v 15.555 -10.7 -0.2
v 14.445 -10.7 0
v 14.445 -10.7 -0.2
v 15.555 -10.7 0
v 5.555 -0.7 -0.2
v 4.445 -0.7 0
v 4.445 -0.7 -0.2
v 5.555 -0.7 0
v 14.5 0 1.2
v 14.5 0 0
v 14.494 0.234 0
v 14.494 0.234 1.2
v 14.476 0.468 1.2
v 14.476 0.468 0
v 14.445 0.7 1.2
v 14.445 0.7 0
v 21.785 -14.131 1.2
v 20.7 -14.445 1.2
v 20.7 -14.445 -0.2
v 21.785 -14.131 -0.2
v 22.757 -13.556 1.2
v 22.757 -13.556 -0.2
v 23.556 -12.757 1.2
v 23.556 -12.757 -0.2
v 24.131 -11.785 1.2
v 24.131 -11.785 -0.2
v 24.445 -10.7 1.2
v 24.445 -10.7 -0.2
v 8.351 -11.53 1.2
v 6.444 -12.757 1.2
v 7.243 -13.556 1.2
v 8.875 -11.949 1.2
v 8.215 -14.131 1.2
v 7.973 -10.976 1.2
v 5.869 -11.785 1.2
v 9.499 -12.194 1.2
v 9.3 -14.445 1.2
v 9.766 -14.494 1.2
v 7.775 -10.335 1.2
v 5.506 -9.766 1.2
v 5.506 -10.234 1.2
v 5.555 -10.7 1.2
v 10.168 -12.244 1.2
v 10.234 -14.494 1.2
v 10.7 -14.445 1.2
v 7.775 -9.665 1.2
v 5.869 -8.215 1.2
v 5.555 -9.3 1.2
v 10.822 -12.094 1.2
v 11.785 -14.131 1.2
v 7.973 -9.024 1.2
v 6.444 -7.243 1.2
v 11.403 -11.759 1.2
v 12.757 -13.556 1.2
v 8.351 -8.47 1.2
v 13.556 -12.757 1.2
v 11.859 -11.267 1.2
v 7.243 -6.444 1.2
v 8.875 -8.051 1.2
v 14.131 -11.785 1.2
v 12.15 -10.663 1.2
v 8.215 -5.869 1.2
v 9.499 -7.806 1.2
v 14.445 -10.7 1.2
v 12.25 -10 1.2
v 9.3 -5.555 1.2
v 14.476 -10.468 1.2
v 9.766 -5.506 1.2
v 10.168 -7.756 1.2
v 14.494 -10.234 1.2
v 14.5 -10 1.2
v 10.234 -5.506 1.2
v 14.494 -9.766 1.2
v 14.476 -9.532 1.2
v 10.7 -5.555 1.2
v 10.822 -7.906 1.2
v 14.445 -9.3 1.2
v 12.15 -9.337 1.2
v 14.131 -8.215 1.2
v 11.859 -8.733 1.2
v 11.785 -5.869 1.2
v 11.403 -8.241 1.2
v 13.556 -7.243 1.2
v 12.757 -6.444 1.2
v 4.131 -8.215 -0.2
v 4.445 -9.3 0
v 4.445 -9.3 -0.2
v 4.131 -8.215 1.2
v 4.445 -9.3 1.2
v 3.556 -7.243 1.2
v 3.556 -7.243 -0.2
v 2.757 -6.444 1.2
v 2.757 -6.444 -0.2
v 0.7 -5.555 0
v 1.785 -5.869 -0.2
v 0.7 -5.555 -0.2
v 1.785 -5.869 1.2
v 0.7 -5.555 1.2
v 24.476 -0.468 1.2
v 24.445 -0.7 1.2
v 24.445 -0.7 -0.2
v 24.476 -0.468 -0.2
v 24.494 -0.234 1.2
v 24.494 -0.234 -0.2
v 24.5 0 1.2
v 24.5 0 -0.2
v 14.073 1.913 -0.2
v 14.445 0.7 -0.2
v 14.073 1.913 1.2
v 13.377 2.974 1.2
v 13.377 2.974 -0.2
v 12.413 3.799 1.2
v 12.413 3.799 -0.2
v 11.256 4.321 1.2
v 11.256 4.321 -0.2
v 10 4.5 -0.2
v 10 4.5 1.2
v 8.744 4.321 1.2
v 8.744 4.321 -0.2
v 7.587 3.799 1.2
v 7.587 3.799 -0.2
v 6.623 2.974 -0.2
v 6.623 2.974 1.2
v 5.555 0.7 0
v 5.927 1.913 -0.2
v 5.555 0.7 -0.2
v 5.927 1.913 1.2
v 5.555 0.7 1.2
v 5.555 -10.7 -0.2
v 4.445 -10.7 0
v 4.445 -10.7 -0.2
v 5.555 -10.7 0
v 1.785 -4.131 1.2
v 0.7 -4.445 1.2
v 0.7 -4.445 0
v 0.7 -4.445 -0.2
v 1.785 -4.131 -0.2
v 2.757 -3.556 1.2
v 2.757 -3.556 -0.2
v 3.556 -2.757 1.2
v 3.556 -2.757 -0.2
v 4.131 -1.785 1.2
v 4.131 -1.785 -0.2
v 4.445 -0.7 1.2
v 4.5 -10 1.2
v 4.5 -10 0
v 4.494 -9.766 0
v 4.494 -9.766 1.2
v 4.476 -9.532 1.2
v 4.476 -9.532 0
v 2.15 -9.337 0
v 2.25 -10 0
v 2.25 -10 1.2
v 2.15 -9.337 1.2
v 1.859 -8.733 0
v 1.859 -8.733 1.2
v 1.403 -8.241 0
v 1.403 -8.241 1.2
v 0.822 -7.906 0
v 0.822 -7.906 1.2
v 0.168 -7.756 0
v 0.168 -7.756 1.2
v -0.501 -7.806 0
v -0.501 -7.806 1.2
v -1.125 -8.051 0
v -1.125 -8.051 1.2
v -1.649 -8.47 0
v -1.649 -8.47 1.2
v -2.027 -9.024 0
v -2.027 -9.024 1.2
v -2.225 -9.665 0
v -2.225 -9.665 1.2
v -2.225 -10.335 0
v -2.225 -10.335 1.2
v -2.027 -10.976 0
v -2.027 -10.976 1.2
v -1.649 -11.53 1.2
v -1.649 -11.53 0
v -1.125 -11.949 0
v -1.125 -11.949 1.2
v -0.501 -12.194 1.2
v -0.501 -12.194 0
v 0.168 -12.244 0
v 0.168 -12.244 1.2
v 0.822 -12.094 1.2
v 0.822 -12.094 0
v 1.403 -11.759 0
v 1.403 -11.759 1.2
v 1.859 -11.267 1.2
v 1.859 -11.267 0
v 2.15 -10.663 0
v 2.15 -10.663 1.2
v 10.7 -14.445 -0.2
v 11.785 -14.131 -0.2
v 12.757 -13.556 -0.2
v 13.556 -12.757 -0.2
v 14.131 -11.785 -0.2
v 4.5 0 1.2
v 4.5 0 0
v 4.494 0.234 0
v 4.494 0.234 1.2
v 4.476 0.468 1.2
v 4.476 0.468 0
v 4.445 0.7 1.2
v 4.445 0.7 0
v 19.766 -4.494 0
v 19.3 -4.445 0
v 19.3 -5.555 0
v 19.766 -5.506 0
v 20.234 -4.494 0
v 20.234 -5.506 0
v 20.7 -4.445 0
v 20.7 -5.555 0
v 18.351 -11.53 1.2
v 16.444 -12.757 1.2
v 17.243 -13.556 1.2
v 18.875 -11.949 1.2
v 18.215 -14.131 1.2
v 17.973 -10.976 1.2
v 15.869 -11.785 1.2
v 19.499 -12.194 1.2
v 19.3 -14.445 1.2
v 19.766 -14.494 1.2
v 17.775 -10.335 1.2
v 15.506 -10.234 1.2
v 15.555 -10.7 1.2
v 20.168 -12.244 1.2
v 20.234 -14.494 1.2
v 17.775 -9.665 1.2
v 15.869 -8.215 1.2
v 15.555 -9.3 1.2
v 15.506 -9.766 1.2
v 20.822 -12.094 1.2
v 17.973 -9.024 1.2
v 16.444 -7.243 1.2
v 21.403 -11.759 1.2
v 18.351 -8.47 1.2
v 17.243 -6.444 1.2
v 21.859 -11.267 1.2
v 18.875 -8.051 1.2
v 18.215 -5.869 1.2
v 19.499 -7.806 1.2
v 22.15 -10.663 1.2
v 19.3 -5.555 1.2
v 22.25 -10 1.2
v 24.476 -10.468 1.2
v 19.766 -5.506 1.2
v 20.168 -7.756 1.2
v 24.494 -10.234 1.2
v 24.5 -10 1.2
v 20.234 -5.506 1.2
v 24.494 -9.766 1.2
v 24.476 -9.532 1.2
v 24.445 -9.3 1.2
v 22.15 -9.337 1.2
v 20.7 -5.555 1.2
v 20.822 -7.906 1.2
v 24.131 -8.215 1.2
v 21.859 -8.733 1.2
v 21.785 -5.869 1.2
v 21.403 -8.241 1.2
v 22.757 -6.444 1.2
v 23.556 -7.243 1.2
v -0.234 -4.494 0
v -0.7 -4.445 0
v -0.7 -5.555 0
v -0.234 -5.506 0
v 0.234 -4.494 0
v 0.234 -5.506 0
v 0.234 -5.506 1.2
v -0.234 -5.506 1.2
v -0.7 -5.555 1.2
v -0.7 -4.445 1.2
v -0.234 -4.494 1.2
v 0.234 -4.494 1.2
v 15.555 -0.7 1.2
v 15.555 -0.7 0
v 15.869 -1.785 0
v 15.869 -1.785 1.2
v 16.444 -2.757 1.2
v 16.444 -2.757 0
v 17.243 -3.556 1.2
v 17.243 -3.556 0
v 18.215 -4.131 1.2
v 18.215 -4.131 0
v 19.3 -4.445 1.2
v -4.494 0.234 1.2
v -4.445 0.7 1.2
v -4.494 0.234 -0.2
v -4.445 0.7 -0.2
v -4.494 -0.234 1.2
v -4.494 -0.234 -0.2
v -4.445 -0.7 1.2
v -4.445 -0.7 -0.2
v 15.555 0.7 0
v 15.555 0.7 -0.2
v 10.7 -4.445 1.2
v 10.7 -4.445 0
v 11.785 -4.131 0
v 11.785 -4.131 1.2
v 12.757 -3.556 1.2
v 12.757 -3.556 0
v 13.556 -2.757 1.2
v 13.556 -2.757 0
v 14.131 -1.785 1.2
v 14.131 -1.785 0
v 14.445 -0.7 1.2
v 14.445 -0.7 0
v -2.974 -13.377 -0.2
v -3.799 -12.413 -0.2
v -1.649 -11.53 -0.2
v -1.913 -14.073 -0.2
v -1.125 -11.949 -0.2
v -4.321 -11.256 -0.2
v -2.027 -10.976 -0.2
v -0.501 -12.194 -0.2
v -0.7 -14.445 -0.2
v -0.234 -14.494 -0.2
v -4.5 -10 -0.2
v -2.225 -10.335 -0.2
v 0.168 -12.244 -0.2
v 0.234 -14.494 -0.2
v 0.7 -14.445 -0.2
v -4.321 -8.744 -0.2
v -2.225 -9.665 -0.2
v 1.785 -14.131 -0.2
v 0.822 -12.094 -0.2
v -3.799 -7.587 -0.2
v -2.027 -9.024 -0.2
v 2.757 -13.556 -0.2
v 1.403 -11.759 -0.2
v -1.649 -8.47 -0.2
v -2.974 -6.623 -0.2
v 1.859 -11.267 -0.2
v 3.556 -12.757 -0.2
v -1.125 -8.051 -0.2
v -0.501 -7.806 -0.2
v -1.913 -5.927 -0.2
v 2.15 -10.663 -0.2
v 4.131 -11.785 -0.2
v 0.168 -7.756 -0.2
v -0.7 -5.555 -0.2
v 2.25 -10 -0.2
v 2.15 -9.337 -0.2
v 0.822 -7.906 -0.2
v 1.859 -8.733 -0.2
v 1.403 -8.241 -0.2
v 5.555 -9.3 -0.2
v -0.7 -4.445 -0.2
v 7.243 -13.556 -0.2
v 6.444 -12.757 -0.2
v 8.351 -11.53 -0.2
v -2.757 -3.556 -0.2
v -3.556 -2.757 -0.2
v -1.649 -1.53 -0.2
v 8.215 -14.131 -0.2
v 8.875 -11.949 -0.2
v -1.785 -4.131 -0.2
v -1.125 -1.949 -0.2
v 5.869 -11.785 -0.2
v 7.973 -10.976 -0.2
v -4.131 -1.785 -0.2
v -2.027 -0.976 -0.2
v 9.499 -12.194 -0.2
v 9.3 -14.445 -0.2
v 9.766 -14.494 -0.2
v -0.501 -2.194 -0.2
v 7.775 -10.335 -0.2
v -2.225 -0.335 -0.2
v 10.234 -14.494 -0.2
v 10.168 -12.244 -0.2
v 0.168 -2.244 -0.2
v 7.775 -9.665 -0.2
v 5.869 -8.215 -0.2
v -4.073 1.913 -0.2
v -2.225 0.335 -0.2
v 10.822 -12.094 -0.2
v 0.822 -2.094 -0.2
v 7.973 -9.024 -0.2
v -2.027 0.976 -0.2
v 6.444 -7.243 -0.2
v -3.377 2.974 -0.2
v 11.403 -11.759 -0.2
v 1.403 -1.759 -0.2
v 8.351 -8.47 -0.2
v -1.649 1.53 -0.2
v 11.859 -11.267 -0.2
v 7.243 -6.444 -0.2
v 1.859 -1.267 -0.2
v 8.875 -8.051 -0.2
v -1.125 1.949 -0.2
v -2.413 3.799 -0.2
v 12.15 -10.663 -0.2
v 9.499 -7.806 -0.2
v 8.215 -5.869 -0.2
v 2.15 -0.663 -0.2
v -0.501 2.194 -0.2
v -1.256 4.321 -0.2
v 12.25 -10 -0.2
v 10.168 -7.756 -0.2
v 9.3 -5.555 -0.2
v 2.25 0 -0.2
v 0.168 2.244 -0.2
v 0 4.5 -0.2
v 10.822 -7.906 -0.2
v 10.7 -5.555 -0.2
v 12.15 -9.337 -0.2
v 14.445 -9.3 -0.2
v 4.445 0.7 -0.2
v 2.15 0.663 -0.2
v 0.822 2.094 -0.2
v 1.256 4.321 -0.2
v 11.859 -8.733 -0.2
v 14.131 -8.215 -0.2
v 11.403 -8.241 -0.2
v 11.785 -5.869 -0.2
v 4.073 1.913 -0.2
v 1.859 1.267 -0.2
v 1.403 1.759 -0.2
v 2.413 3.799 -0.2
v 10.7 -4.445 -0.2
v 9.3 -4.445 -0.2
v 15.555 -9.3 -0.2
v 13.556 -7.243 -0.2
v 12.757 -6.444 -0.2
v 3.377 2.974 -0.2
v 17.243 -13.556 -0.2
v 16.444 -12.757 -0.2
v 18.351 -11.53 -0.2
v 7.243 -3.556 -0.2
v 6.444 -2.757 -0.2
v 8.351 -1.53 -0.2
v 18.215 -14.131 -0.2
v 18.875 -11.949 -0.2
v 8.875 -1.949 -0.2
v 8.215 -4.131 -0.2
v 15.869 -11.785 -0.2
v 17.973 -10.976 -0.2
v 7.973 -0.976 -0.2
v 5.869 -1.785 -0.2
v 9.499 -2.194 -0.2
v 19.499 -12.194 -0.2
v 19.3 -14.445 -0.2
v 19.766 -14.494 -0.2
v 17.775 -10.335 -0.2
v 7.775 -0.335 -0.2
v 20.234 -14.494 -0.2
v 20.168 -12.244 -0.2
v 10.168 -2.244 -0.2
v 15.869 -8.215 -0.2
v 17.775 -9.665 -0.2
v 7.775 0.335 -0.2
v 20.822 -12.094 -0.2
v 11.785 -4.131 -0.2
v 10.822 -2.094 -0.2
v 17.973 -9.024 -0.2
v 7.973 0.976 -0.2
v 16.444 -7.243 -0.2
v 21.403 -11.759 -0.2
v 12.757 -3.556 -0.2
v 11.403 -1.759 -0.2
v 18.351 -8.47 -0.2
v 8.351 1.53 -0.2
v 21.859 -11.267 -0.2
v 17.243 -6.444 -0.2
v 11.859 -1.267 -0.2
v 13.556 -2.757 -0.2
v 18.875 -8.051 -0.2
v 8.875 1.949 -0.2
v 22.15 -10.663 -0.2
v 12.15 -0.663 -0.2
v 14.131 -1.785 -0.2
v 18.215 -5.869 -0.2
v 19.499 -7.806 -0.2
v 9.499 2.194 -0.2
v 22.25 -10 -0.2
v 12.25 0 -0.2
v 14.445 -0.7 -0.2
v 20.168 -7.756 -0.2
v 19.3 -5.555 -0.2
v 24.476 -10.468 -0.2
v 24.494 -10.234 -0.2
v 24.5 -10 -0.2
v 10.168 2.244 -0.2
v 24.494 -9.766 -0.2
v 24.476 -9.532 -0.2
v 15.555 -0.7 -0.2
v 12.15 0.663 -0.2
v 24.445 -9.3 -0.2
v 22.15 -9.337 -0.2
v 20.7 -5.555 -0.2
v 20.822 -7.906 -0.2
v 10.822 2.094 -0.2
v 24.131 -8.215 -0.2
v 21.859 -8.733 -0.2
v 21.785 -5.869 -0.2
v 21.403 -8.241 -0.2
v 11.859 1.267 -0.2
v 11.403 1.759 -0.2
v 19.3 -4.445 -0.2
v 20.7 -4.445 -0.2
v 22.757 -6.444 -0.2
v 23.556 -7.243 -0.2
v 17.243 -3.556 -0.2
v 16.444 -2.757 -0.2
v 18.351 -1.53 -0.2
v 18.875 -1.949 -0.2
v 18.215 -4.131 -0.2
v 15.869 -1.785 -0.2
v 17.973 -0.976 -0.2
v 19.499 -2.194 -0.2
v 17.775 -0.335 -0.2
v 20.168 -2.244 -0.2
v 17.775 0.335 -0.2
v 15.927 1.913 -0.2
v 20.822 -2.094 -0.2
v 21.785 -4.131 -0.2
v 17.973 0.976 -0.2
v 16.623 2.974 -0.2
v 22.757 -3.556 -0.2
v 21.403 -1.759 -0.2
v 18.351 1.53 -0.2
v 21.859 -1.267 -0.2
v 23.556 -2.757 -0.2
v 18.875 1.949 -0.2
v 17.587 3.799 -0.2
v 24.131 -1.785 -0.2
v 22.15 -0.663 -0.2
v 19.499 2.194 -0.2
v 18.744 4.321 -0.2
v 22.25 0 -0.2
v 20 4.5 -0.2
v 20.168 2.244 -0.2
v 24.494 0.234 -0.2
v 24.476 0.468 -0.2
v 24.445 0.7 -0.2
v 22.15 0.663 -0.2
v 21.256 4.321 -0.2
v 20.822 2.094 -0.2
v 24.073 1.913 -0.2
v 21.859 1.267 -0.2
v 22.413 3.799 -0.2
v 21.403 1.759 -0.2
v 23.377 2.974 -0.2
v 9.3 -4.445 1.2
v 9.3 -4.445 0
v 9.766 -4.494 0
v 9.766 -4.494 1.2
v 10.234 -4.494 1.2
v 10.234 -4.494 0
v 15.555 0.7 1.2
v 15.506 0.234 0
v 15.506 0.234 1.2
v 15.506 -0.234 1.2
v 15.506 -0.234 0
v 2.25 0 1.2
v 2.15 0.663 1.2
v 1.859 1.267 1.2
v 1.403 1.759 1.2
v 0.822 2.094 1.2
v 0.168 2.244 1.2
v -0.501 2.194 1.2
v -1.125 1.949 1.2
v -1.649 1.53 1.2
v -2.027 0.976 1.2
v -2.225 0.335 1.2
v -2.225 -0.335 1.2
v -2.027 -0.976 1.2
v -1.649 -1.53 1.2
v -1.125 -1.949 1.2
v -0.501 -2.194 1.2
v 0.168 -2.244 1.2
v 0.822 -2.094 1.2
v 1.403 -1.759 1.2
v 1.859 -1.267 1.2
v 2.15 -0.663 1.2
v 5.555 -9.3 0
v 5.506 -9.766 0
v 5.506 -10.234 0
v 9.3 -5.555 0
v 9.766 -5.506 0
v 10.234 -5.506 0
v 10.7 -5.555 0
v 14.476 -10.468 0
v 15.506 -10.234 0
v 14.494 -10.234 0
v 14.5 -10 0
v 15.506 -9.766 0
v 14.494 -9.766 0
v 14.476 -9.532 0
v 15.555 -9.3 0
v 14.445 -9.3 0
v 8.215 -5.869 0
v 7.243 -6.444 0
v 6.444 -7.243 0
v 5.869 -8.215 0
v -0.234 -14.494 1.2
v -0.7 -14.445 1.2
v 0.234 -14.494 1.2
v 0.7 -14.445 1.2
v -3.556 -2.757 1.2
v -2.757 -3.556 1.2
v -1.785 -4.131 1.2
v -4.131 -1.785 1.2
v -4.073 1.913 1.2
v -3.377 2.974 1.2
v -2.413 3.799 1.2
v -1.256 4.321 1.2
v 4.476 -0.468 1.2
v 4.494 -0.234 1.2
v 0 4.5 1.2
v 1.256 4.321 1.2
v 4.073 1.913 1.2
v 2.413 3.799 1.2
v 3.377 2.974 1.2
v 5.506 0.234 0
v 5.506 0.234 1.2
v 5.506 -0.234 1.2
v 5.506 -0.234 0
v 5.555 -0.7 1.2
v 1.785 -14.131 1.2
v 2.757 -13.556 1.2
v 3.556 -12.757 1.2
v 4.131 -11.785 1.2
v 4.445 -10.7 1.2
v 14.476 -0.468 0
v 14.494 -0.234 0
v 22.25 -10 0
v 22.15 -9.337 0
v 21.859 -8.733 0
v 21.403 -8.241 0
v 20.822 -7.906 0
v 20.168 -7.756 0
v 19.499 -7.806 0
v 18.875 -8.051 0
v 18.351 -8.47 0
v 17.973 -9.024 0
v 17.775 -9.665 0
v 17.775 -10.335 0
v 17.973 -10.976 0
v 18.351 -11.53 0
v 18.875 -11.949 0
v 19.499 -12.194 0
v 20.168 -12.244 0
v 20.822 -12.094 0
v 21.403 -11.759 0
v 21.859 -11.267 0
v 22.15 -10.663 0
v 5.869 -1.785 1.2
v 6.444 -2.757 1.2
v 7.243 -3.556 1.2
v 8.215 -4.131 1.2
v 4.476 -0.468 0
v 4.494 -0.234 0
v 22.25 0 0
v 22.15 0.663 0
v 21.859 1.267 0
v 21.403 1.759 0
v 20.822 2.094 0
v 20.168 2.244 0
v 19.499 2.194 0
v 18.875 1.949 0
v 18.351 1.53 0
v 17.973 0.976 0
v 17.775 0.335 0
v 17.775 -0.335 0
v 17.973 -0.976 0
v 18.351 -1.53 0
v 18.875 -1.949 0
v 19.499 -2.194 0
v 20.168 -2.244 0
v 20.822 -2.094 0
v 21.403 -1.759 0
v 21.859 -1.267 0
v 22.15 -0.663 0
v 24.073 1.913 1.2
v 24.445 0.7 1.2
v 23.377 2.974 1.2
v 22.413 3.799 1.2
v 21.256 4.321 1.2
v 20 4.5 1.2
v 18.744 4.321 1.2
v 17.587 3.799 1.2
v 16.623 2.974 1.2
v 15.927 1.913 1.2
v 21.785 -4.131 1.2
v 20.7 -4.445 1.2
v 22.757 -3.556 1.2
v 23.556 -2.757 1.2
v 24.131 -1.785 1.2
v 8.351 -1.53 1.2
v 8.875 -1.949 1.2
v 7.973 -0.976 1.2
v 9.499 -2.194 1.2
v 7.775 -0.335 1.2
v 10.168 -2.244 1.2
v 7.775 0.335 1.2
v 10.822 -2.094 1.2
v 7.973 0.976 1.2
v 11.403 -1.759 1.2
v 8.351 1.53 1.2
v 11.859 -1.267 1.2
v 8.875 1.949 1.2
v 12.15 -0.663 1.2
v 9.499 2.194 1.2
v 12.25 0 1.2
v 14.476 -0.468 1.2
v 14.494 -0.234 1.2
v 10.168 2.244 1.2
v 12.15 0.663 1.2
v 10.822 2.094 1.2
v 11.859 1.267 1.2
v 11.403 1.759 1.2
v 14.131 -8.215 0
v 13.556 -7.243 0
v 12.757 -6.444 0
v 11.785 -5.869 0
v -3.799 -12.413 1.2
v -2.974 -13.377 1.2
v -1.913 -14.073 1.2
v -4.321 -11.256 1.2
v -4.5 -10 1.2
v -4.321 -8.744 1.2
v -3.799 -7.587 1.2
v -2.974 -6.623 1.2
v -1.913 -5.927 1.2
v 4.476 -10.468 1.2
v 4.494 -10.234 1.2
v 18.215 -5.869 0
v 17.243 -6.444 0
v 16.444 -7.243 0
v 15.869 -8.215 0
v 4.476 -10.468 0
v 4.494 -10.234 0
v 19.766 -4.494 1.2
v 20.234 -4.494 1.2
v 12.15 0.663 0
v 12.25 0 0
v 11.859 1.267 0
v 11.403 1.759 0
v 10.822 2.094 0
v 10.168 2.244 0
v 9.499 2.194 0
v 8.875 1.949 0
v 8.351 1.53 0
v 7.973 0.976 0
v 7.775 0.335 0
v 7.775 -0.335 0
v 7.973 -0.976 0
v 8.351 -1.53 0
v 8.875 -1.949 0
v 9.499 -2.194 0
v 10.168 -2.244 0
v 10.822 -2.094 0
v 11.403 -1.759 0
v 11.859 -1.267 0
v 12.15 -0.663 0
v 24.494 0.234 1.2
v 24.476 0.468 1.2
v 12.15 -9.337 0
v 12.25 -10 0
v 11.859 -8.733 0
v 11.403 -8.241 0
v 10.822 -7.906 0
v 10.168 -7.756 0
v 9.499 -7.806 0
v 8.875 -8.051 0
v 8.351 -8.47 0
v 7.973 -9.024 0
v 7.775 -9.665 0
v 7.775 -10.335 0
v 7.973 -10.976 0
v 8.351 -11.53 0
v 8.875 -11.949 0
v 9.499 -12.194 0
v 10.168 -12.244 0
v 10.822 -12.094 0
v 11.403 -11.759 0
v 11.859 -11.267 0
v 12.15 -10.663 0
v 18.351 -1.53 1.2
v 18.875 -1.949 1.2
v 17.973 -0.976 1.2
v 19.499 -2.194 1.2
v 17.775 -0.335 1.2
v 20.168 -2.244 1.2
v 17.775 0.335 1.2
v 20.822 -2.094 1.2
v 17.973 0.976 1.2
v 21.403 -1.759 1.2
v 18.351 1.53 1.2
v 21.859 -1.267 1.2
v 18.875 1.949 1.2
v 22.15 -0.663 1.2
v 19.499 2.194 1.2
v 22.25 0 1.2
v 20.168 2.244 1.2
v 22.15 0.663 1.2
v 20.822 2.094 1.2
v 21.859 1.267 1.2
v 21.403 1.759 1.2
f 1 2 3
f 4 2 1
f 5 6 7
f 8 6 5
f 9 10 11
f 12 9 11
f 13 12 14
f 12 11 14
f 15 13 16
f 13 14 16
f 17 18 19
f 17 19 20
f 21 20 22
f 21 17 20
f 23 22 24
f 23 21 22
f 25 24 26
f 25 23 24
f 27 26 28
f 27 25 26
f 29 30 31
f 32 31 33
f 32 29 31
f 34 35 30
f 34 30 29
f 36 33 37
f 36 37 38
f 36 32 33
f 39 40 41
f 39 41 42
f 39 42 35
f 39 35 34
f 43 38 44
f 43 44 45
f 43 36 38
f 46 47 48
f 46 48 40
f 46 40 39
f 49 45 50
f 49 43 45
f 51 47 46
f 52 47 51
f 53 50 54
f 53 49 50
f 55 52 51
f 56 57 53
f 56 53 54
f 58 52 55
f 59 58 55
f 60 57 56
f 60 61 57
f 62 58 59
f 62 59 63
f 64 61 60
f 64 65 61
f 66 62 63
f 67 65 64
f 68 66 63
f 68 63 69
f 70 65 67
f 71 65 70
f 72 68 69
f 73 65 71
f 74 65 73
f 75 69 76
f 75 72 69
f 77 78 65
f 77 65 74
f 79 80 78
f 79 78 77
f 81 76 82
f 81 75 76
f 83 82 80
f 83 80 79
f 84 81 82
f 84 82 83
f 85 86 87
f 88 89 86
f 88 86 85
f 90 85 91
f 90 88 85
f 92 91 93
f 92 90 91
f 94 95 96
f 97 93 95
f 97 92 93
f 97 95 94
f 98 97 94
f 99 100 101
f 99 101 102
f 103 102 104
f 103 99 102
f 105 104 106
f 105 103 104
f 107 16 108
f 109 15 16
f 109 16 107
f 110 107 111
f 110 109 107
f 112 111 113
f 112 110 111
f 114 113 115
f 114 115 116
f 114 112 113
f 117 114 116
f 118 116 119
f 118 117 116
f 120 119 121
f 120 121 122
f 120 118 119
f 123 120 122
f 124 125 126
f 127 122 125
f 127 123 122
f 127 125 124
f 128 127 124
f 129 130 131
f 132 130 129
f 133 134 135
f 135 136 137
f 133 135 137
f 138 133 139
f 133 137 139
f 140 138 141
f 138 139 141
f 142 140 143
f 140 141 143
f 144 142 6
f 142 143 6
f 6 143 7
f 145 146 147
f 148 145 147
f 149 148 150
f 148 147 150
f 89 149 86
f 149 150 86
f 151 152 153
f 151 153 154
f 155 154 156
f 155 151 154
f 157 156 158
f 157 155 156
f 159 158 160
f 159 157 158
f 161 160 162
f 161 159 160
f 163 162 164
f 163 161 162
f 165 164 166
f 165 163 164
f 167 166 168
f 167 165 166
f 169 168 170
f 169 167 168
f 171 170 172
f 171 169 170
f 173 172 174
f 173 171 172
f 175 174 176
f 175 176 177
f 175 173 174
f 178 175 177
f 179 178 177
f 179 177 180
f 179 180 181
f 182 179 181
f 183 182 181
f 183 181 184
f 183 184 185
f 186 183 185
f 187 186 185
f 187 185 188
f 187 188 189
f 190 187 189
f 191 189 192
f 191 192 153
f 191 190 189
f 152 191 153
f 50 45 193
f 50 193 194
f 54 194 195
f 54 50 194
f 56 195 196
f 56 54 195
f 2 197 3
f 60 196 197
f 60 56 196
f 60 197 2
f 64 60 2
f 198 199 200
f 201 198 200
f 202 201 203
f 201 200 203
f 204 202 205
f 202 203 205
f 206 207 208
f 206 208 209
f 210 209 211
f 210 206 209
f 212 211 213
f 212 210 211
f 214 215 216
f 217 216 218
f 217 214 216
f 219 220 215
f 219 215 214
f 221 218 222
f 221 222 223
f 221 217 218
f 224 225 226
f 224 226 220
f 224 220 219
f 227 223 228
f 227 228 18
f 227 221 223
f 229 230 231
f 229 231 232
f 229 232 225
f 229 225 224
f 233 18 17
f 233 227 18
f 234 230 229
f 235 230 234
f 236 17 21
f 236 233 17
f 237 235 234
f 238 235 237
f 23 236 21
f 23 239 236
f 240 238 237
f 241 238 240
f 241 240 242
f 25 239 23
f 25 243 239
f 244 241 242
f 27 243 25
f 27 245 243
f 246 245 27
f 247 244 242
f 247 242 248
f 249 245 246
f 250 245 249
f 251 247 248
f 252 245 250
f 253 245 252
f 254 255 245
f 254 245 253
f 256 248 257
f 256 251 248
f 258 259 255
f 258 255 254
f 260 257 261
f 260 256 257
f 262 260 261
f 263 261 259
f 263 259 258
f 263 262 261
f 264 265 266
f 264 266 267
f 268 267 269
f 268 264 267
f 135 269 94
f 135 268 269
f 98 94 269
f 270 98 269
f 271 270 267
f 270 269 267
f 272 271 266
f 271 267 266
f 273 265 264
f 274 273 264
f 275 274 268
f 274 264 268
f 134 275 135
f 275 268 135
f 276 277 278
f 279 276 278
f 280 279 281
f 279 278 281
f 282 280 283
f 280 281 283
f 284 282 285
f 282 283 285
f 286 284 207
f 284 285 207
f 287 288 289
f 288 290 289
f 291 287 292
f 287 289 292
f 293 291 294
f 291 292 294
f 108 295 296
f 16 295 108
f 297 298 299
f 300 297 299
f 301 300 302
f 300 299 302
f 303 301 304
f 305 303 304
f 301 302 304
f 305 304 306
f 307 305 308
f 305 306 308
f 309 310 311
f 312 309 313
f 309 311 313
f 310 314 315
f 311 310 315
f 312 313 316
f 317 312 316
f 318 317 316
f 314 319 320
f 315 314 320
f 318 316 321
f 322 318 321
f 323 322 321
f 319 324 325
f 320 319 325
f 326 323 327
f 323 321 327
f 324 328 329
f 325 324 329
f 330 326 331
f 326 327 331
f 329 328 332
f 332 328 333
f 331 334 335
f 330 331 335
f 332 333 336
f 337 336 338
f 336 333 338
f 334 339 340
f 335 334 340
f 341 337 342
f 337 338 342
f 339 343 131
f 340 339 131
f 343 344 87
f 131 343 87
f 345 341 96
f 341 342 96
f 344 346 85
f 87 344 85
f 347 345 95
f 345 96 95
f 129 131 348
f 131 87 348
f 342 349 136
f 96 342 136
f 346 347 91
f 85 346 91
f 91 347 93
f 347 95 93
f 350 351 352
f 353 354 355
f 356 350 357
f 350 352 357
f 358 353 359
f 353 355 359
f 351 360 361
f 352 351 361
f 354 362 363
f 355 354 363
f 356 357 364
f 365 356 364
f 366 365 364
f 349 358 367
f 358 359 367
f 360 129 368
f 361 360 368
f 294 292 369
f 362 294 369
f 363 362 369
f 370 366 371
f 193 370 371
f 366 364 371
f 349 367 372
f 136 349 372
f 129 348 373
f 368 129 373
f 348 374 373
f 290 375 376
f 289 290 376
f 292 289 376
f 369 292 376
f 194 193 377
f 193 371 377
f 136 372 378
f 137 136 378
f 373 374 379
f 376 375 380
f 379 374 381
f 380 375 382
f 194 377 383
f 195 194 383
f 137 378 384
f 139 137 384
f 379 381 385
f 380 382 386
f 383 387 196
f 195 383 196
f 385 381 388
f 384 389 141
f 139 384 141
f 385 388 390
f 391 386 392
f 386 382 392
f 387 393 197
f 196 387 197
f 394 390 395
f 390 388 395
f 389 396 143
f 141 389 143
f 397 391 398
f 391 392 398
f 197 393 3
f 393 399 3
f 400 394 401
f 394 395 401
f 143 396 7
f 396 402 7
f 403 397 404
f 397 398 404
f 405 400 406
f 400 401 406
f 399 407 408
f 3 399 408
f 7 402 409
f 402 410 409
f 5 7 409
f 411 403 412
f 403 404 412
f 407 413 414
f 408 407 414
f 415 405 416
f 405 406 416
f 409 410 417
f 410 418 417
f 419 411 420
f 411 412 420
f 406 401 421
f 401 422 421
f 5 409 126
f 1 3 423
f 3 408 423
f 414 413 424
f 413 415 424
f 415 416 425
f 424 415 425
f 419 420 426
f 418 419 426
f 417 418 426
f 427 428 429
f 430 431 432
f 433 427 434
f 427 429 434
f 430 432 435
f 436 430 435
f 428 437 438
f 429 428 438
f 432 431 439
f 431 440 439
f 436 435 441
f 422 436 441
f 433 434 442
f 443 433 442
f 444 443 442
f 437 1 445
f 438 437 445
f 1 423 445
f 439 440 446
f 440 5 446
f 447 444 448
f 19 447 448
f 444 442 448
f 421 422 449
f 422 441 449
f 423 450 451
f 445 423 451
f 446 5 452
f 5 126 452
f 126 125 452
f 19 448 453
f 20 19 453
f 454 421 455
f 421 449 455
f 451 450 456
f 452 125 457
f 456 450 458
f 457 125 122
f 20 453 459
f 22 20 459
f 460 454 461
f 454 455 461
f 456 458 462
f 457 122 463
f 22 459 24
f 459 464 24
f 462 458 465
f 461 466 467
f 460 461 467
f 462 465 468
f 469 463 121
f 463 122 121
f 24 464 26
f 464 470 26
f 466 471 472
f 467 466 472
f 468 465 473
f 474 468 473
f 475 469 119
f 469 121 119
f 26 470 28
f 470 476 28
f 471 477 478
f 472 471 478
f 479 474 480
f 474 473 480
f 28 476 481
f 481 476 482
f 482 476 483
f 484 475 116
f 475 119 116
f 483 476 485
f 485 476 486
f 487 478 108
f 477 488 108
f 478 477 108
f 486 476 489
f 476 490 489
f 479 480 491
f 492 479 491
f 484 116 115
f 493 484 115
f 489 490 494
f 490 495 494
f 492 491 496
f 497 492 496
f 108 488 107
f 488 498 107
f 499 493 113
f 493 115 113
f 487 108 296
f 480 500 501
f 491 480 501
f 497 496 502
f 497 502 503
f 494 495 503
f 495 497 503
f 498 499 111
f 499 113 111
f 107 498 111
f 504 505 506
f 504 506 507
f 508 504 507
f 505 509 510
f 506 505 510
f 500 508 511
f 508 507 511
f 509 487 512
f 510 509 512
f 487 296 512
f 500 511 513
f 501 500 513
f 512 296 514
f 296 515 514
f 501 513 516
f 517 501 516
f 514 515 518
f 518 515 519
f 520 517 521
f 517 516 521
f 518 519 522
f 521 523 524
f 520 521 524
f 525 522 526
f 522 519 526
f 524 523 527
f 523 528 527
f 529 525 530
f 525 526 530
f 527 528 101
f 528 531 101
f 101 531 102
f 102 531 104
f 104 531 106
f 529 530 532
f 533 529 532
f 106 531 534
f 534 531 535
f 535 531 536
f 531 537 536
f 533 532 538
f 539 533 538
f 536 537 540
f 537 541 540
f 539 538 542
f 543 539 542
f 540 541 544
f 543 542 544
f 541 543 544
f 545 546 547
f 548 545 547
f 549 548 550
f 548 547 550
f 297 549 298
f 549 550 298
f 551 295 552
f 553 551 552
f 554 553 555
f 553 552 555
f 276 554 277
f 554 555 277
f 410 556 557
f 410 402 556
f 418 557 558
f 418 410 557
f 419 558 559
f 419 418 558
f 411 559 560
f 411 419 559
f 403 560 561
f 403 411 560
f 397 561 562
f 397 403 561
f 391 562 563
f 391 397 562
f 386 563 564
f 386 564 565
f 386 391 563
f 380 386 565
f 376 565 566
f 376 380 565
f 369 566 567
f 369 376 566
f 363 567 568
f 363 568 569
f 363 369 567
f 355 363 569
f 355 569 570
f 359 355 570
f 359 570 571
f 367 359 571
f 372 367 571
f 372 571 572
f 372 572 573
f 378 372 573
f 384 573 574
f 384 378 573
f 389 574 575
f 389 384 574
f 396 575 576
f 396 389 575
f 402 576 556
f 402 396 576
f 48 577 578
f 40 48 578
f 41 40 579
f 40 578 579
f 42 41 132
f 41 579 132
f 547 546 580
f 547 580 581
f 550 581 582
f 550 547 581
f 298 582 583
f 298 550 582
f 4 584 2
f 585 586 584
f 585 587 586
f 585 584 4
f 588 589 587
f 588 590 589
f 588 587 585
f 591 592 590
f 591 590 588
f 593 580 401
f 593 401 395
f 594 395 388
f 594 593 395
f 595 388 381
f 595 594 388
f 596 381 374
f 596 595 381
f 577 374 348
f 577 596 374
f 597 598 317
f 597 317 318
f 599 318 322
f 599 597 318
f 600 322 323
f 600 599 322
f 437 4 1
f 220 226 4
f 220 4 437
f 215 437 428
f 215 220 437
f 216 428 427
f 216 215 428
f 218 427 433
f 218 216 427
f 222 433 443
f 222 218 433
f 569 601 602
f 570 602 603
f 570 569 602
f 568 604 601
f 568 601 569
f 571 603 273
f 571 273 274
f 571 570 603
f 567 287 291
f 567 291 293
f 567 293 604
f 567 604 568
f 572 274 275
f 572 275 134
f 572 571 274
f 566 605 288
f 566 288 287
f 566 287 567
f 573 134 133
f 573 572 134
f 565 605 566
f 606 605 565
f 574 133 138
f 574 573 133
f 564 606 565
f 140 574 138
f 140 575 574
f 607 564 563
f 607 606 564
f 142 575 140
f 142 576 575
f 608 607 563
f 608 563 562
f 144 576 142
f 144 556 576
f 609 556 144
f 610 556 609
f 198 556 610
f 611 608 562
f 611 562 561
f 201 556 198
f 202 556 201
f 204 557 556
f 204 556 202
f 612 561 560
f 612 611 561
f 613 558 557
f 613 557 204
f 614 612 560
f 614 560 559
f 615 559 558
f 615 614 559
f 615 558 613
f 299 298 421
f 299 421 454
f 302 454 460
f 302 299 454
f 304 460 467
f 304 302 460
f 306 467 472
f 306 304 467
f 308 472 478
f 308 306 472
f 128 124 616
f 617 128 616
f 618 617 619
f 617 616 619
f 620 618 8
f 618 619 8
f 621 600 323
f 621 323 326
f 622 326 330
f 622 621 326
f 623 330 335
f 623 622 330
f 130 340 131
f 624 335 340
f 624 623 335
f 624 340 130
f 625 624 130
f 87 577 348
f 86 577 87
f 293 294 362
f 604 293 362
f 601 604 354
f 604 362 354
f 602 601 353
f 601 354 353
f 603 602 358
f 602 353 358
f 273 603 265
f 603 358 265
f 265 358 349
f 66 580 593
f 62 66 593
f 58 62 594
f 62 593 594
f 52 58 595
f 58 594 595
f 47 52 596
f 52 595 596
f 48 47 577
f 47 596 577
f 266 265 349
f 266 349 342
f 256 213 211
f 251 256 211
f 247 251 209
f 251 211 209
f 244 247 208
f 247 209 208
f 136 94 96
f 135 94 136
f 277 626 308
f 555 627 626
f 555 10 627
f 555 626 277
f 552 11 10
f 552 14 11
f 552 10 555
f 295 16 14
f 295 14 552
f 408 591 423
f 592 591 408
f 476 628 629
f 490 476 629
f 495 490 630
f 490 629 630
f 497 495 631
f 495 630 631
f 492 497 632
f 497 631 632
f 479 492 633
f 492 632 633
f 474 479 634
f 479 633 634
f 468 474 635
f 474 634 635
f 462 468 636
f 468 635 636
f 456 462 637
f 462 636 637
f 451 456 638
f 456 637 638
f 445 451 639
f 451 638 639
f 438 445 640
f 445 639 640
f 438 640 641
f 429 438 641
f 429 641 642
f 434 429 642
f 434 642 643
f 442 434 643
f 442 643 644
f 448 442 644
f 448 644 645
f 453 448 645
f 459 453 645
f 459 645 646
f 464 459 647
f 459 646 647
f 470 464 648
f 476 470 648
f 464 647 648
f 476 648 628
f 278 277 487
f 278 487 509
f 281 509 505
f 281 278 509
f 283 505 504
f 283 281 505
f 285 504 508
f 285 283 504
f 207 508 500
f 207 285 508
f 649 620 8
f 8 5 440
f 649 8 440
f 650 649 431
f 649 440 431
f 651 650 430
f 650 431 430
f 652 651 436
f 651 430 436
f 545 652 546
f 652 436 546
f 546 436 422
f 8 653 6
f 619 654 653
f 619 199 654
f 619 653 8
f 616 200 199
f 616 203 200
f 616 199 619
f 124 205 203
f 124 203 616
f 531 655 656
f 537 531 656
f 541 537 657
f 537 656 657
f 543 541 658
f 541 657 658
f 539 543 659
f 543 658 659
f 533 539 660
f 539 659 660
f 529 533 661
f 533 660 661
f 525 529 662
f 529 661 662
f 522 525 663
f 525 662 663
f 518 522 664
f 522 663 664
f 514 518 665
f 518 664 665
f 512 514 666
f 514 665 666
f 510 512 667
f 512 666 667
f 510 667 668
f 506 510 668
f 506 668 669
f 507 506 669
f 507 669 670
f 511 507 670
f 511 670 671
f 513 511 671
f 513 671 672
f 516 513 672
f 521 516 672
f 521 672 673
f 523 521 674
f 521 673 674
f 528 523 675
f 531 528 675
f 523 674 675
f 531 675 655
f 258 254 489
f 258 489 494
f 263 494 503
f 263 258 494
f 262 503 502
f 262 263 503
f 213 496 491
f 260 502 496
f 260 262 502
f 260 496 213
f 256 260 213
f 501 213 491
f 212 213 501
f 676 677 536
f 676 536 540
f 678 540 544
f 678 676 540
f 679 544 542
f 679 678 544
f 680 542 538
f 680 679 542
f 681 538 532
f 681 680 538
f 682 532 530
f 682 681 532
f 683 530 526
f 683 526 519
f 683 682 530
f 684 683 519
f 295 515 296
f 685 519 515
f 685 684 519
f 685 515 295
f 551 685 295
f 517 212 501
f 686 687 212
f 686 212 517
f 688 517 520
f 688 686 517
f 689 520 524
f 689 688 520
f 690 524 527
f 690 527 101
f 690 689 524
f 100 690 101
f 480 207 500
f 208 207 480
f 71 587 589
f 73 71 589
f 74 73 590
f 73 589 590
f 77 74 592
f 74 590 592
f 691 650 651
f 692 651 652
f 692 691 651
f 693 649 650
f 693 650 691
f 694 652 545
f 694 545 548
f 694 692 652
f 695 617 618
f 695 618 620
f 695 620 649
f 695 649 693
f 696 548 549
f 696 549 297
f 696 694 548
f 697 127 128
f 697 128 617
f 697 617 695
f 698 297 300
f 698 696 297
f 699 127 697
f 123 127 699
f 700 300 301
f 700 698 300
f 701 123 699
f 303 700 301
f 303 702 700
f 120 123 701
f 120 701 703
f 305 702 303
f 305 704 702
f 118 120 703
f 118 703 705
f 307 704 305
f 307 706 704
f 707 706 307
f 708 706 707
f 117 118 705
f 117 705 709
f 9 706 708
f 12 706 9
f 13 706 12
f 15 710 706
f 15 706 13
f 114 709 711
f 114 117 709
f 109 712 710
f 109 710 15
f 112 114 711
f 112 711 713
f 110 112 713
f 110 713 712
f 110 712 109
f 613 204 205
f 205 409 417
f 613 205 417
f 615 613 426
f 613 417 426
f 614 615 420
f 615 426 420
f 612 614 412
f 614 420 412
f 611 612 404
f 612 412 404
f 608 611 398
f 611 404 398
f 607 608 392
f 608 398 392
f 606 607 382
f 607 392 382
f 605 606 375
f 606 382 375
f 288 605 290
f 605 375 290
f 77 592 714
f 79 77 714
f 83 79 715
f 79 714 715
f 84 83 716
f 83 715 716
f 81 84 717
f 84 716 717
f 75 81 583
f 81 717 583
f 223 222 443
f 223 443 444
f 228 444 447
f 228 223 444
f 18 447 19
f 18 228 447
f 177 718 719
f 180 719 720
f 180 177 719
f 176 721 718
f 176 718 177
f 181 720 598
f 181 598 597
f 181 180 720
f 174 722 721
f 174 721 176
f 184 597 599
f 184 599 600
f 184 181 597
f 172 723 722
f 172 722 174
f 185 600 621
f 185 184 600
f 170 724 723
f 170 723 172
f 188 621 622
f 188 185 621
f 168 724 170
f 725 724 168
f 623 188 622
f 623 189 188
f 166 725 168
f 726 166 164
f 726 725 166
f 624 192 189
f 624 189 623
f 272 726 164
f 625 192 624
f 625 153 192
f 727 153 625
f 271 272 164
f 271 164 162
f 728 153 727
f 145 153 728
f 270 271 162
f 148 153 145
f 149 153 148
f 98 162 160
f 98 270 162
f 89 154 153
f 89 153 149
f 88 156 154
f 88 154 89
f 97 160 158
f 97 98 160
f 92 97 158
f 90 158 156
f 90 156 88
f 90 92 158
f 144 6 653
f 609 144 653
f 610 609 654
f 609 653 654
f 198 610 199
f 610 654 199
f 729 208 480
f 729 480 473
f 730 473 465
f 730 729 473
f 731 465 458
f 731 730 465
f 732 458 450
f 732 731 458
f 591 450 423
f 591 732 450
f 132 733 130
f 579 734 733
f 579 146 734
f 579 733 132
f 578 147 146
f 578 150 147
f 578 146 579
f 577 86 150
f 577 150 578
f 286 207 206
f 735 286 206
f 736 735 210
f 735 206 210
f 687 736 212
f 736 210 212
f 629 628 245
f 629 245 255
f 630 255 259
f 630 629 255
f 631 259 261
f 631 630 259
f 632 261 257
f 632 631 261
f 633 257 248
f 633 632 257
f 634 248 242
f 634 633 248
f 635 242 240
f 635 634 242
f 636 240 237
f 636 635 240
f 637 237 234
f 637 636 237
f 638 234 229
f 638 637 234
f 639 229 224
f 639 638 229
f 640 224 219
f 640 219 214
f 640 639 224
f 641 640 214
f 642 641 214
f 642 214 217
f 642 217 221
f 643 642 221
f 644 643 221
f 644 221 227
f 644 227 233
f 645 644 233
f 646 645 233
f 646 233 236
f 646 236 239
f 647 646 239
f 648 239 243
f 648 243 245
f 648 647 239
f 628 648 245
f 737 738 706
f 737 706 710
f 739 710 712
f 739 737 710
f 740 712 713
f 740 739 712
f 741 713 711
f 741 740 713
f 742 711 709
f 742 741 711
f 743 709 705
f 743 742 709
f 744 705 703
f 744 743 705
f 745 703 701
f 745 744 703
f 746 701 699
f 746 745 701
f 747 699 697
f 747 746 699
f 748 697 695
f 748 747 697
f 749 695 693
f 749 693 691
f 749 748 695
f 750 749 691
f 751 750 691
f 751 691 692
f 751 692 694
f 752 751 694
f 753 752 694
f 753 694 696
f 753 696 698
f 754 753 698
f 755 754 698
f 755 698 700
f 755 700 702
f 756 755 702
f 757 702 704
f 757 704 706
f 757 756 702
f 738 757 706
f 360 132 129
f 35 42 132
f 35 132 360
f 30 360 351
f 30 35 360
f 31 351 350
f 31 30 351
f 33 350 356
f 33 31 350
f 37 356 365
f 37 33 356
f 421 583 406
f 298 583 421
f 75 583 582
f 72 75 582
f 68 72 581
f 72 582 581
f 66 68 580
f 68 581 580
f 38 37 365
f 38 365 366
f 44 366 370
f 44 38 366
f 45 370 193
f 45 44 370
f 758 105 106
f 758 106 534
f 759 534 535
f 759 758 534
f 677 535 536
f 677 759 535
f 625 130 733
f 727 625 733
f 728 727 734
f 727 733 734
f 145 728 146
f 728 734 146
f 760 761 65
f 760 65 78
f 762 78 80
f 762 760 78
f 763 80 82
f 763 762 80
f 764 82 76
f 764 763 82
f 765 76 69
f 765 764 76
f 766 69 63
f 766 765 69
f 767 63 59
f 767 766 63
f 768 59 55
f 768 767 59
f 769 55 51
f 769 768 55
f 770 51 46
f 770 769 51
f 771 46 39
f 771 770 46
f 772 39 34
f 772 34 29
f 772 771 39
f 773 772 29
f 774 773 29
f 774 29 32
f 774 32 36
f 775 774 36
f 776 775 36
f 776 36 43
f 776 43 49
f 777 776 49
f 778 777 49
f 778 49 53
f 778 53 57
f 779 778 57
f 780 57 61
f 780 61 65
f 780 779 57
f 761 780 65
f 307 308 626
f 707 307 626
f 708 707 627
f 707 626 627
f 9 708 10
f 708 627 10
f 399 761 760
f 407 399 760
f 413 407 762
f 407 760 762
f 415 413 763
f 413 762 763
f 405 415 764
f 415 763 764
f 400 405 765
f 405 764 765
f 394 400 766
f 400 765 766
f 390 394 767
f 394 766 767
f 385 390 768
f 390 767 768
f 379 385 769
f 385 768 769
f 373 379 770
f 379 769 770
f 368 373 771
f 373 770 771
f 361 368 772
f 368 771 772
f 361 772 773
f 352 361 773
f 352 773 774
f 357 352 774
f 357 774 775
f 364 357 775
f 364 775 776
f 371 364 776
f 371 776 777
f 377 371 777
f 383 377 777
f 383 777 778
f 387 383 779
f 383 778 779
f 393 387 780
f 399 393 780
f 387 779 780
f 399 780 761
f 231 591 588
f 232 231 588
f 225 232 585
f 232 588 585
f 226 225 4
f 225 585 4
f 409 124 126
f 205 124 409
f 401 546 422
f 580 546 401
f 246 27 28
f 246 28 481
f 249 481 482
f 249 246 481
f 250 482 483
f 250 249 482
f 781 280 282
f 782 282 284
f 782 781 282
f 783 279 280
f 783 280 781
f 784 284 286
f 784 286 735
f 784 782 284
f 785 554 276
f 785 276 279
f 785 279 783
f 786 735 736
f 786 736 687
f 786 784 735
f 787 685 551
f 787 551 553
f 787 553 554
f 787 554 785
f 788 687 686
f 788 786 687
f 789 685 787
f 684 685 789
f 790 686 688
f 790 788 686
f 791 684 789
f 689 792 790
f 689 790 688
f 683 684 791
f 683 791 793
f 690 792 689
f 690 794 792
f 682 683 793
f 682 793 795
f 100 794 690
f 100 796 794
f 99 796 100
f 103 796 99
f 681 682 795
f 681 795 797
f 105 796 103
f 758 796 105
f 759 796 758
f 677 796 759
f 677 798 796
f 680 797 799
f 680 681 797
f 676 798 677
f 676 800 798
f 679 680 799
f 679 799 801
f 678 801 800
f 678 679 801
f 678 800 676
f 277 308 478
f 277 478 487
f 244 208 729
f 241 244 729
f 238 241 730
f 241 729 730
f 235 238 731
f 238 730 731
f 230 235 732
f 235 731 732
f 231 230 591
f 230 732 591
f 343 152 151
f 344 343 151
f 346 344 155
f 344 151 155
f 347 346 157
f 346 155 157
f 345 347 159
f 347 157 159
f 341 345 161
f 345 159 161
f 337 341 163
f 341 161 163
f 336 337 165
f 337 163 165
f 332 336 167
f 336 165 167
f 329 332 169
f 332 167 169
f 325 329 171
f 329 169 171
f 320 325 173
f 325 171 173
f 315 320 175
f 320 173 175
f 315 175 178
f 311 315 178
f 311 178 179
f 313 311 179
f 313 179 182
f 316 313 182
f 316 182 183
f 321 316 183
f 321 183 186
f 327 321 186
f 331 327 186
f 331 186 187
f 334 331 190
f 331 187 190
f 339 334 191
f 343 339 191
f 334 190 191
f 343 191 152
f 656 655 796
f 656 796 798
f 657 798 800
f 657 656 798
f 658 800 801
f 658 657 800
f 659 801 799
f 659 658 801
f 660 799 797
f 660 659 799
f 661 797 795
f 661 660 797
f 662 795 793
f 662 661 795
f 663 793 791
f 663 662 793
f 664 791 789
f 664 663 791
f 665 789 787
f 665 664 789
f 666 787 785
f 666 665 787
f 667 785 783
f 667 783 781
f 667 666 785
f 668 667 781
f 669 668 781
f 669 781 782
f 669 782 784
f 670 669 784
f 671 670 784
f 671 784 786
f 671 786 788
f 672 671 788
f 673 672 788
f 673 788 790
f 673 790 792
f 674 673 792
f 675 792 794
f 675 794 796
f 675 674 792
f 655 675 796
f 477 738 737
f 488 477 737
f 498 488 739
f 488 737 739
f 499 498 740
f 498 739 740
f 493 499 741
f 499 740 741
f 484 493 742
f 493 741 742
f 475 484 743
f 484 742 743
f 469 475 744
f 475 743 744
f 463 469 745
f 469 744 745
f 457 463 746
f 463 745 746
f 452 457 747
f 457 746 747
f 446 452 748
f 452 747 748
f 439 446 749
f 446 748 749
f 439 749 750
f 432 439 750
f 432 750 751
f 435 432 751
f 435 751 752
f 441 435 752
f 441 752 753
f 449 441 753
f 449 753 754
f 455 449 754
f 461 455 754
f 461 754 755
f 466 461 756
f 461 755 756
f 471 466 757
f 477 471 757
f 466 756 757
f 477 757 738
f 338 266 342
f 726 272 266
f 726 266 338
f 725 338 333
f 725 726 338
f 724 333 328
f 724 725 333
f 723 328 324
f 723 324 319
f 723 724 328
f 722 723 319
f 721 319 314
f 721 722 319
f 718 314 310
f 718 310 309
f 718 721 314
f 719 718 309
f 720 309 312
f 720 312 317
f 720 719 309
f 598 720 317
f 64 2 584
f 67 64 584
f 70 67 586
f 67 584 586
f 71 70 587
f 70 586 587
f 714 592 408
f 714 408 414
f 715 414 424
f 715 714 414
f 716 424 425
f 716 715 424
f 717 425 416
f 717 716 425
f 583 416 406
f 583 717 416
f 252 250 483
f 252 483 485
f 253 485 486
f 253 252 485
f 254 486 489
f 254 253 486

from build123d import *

# Parameters (mm, degrees)
F0_R     = 2.25
F1_DEPTH = 0.2
F2_DEPTH = 1.2


with BuildPart() as f1:
    # F0 (on Top) → F1 (new body)
    with BuildSketch(Plane.XY):
        with BuildLine():
            Line((0.7, -5.554778), (0.7, -4.445222))
            ThreePointArc((0.7, -4.445222), (0, -4.5), (-0.7, -4.445222))
            Line((-0.7, -4.445222), (-0.7, -5.554778))
            ThreePointArc((-0.7, -5.554778), (0, -5.5), (0.7, -5.554778))
        make_face()
        with BuildLine():
            ThreePointArc((4.445222, 0.7), (4.486285, 0.35107), (4.5, 0))
            ThreePointArc((4.5, 0), (4.486285, -0.35107), (4.445222, -0.7))
            Line((4.445222, -0.7), (5.554778, -0.7))
            ThreePointArc((5.554778, -0.7), (5.5, 0), (5.554778, 0.7))
            Line((5.554778, 0.7), (4.445222, 0.7))
        make_face()
        with BuildLine():
            Line((5.554778, -9.3), (4.445222, -9.3))
            ThreePointArc((4.445222, -9.3), (4.486285, -9.64893), (4.5, -10))
            ThreePointArc((4.5, -10), (4.486285, -10.35107), (4.445222, -10.7))
            Line((4.445222, -10.7), (5.554778, -10.7))
            ThreePointArc((5.554778, -10.7), (5.5, -10), (5.554778, -9.3))
        make_face()
        with BuildLine():
            Line((15.554778, 0.7), (14.445222, 0.7))
            ThreePointArc((14.445222, 0.7), (14.486285, 0.35107), (14.5, 0))
            ThreePointArc((14.5, 0), (14.486285, -0.35107), (14.445222, -0.7))
            Line((14.445222, -0.7), (15.554778, -0.7))
            ThreePointArc((15.554778, -0.7), (15.5, 0), (15.554778, 0.7))
        make_face()
        with BuildLine():
            Line((15.554778, -9.3), (14.445222, -9.3))
            ThreePointArc((14.445222, -9.3), (14.486285, -9.64893), (14.5, -10))
            ThreePointArc((14.5, -10), (14.486285, -10.35107), (14.445222, -10.7))
            Line((14.445222, -10.7), (15.554778, -10.7))
            ThreePointArc((15.554778, -10.7), (15.5, -10), (15.554778, -9.3))
        make_face()
        with BuildLine():
            ThreePointArc((20.7, -4.445222), (20, -4.5), (19.3, -4.445222))
            Line((19.3, -4.445222), (19.3, -5.554778))
            ThreePointArc((19.3, -5.554778), (20, -5.5), (20.7, -5.554778))
            Line((20.7, -5.554778), (20.7, -4.445222))
        make_face()
        with BuildLine():
            ThreePointArc((4.445222, -9.3), (3.181981, -6.818019), (0.7, -5.554778))
            ThreePointArc((0.7, -5.554778), (0, -5.5), (-0.7, -5.554778))
            ThreePointArc((-0.7, -5.554778), (-4.5, -10), (-0.7, -14.445222))
            ThreePointArc((-0.7, -14.445222), (0, -14.5), (0.7, -14.445222))
            ThreePointArc((0.7, -14.445222), (3.181981, -13.181981), (4.445222, -10.7))
            ThreePointArc((4.445222, -10.7), (4.486285, -10.35107), (4.5, -10))
            ThreePointArc((4.5, -10), (4.486285, -9.64893), (4.445222, -9.3))
        make_face()
        with Locations((0, -10)):
            Circle(F0_R, mode=Mode.SUBTRACT)
        with BuildLine():
            ThreePointArc((24.445222, 0.7), (20, 4.5), (15.554778, 0.7))
            ThreePointArc((15.554778, 0.7), (15.5, 0), (15.554778, -0.7))
            ThreePointArc((15.554778, -0.7), (16.818019, -3.181981), (19.3, -4.445222))
            ThreePointArc((19.3, -4.445222), (20, -4.5), (20.7, -4.445222))
            ThreePointArc((20.7, -4.445222), (23.181981, -3.181981), (24.445222, -0.7))
            ThreePointArc((24.445222, -0.7), (24.486285, -0.35107), (24.5, 0))
            ThreePointArc((24.5, 0), (24.486285, 0.35107), (24.445222, 0.7))
        make_face()
        with Locations((20, 0)):
            Circle(F0_R, mode=Mode.SUBTRACT)
        with BuildLine():
            ThreePointArc((20.7, -5.554778), (20, -5.5), (19.3, -5.554778))
            ThreePointArc((19.3, -5.554778), (16.818019, -6.818019), (15.554778, -9.3))
            ThreePointArc((15.554778, -9.3), (15.5, -10), (15.554778, -10.7))
            ThreePointArc((15.554778, -10.7), (16.818019, -13.181981), (19.3, -14.445222))
            ThreePointArc((19.3, -14.445222), (20, -14.5), (20.7, -14.445222))
            ThreePointArc((20.7, -14.445222), (23.181981, -13.181981), (24.445222, -10.7))
            ThreePointArc((24.445222, -10.7), (24.486285, -10.35107), (24.5, -10))
            ThreePointArc((24.5, -10), (24.486285, -9.64893), (24.445222, -9.3))
            ThreePointArc((24.445222, -9.3), (23.181981, -6.818019), (20.7, -5.554778))
        make_face()
        with Locations((20, -10)):
            Circle(F0_R, mode=Mode.SUBTRACT)
        with BuildLine():
            ThreePointArc((14.445222, 0.7), (10, 4.5), (5.554778, 0.7))
            ThreePointArc((5.554778, 0.7), (5.5, 0), (5.554778, -0.7))
            ThreePointArc((5.554778, -0.7), (6.818019, -3.181981), (9.3, -4.445222))
            ThreePointArc((9.3, -4.445222), (10, -4.5), (10.7, -4.445222))
            ThreePointArc((10.7, -4.445222), (13.181981, -3.181981), (14.445222, -0.7))
            ThreePointArc((14.445222, -0.7), (14.486285, -0.35107), (14.5, 0))
            ThreePointArc((14.5, 0), (14.486285, 0.35107), (14.445222, 0.7))
        make_face()
        with Locations((10, 0)):
            Circle(F0_R, mode=Mode.SUBTRACT)
        with BuildLine():
            ThreePointArc((10.7, -5.554778), (10, -5.5), (9.3, -5.554778))
            ThreePointArc((9.3, -5.554778), (6.818019, -6.818019), (5.554778, -9.3))
            ThreePointArc((5.554778, -9.3), (5.5, -10), (5.554778, -10.7))
            ThreePointArc((5.554778, -10.7), (6.818019, -13.181981), (9.3, -14.445222))
            ThreePointArc((9.3, -14.445222), (10, -14.5), (10.7, -14.445222))
            ThreePointArc((10.7, -14.445222), (13.181981, -13.181981), (14.445222, -10.7))
            ThreePointArc((14.445222, -10.7), (14.486285, -10.35107), (14.5, -10))
            ThreePointArc((14.5, -10), (14.486285, -9.64893), (14.445222, -9.3))
            ThreePointArc((14.445222, -9.3), (13.181981, -6.818019), (10.7, -5.554778))
        make_face()
        with Locations((10, -10)):
            Circle(F0_R, mode=Mode.SUBTRACT)
        with BuildLine():
            ThreePointArc((4.445222, -0.7), (4.486285, -0.35107), (4.5, 0))
            ThreePointArc((4.5, 0), (4.486285, 0.35107), (4.445222, 0.7))
            ThreePointArc((4.445222, 0.7), (0, 4.5), (-4.445222, 0.7))
            ThreePointArc((-4.445222, 0.7), (-4.5, 0), (-4.445222, -0.7))
            ThreePointArc((-4.445222, -0.7), (-3.181981, -3.181981), (-0.7, -4.445222))
            ThreePointArc((-0.7, -4.445222), (0, -4.5), (0.7, -4.445222))
            ThreePointArc((0.7, -4.445222), (3.181981, -3.181981), (4.445222, -0.7))
        make_face()
        Circle(F0_R, mode=Mode.SUBTRACT)
        with BuildLine():
            ThreePointArc((10.7, -4.445222), (10, -4.5), (9.3, -4.445222))
            Line((9.3, -4.445222), (9.3, -5.554778))
            ThreePointArc((9.3, -5.554778), (10, -5.5), (10.7, -5.554778))
            Line((10.7, -5.554778), (10.7, -4.445222))
        make_face()
    extrude(amount=-F1_DEPTH)

    # F0 (on Top) → F2 (join)
    with BuildSketch(Plane.XY):
        with BuildLine():
            ThreePointArc((4.445222, -0.7), (4.486285, -0.35107), (4.5, 0))
            ThreePointArc((4.5, 0), (4.486285, 0.35107), (4.445222, 0.7))
            ThreePointArc((4.445222, 0.7), (0, 4.5), (-4.445222, 0.7))
            ThreePointArc((-4.445222, 0.7), (-4.5, 0), (-4.445222, -0.7))
            ThreePointArc((-4.445222, -0.7), (-3.181981, -3.181981), (-0.7, -4.445222))
            ThreePointArc((-0.7, -4.445222), (0, -4.5), (0.7, -4.445222))
            ThreePointArc((0.7, -4.445222), (3.181981, -3.181981), (4.445222, -0.7))
        make_face()
        Circle(F0_R, mode=Mode.SUBTRACT)
        with BuildLine():
            ThreePointArc((14.445222, 0.7), (10, 4.5), (5.554778, 0.7))
            ThreePointArc((5.554778, 0.7), (5.5, 0), (5.554778, -0.7))
            ThreePointArc((5.554778, -0.7), (6.818019, -3.181981), (9.3, -4.445222))
            ThreePointArc((9.3, -4.445222), (10, -4.5), (10.7, -4.445222))
            ThreePointArc((10.7, -4.445222), (13.181981, -3.181981), (14.445222, -0.7))
            ThreePointArc((14.445222, -0.7), (14.486285, -0.35107), (14.5, 0))
            ThreePointArc((14.5, 0), (14.486285, 0.35107), (14.445222, 0.7))
        make_face()
        with Locations((10, 0)):
            Circle(F0_R, mode=Mode.SUBTRACT)
        with BuildLine():
            ThreePointArc((24.445222, 0.7), (20, 4.5), (15.554778, 0.7))
            ThreePointArc((15.554778, 0.7), (15.5, 0), (15.554778, -0.7))
            ThreePointArc((15.554778, -0.7), (16.818019, -3.181981), (19.3, -4.445222))
            ThreePointArc((19.3, -4.445222), (20, -4.5), (20.7, -4.445222))
            ThreePointArc((20.7, -4.445222), (23.181981, -3.181981), (24.445222, -0.7))
            ThreePointArc((24.445222, -0.7), (24.486285, -0.35107), (24.5, 0))
            ThreePointArc((24.5, 0), (24.486285, 0.35107), (24.445222, 0.7))
        make_face()
        with Locations((20, 0)):
            Circle(F0_R, mode=Mode.SUBTRACT)
        with BuildLine():
            ThreePointArc((20.7, -5.554778), (20, -5.5), (19.3, -5.554778))
            ThreePointArc((19.3, -5.554778), (16.818019, -6.818019), (15.554778, -9.3))
            ThreePointArc((15.554778, -9.3), (15.5, -10), (15.554778, -10.7))
            ThreePointArc((15.554778, -10.7), (16.818019, -13.181981), (19.3, -14.445222))
            ThreePointArc((19.3, -14.445222), (20, -14.5), (20.7, -14.445222))
            ThreePointArc((20.7, -14.445222), (23.181981, -13.181981), (24.445222, -10.7))
            ThreePointArc((24.445222, -10.7), (24.486285, -10.35107), (24.5, -10))
            ThreePointArc((24.5, -10), (24.486285, -9.64893), (24.445222, -9.3))
            ThreePointArc((24.445222, -9.3), (23.181981, -6.818019), (20.7, -5.554778))
        make_face()
        with Locations((20, -10)):
            Circle(F0_R, mode=Mode.SUBTRACT)
        with BuildLine():
            ThreePointArc((10.7, -5.554778), (10, -5.5), (9.3, -5.554778))
            ThreePointArc((9.3, -5.554778), (6.818019, -6.818019), (5.554778, -9.3))
            ThreePointArc((5.554778, -9.3), (5.5, -10), (5.554778, -10.7))
            ThreePointArc((5.554778, -10.7), (6.818019, -13.181981), (9.3, -14.445222))
            ThreePointArc((9.3, -14.445222), (10, -14.5), (10.7, -14.445222))
            ThreePointArc((10.7, -14.445222), (13.181981, -13.181981), (14.445222, -10.7))
            ThreePointArc((14.445222, -10.7), (14.486285, -10.35107), (14.5, -10))
            ThreePointArc((14.5, -10), (14.486285, -9.64893), (14.445222, -9.3))
            ThreePointArc((14.445222, -9.3), (13.181981, -6.818019), (10.7, -5.554778))
        make_face()
        with Locations((10, -10)):
            Circle(F0_R, mode=Mode.SUBTRACT)
        with BuildLine():
            ThreePointArc((4.445222, -9.3), (3.181981, -6.818019), (0.7, -5.554778))
            ThreePointArc((0.7, -5.554778), (0, -5.5), (-0.7, -5.554778))
            ThreePointArc((-0.7, -5.554778), (-4.5, -10), (-0.7, -14.445222))
            ThreePointArc((-0.7, -14.445222), (0, -14.5), (0.7, -14.445222))
            ThreePointArc((0.7, -14.445222), (3.181981, -13.181981), (4.445222, -10.7))
            ThreePointArc((4.445222, -10.7), (4.486285, -10.35107), (4.5, -10))
            ThreePointArc((4.5, -10), (4.486285, -9.64893), (4.445222, -9.3))
        make_face()
        with Locations((0, -10)):
            Circle(F0_R, mode=Mode.SUBTRACT)
    extrude(amount=F2_DEPTH)


solid = f1.part
